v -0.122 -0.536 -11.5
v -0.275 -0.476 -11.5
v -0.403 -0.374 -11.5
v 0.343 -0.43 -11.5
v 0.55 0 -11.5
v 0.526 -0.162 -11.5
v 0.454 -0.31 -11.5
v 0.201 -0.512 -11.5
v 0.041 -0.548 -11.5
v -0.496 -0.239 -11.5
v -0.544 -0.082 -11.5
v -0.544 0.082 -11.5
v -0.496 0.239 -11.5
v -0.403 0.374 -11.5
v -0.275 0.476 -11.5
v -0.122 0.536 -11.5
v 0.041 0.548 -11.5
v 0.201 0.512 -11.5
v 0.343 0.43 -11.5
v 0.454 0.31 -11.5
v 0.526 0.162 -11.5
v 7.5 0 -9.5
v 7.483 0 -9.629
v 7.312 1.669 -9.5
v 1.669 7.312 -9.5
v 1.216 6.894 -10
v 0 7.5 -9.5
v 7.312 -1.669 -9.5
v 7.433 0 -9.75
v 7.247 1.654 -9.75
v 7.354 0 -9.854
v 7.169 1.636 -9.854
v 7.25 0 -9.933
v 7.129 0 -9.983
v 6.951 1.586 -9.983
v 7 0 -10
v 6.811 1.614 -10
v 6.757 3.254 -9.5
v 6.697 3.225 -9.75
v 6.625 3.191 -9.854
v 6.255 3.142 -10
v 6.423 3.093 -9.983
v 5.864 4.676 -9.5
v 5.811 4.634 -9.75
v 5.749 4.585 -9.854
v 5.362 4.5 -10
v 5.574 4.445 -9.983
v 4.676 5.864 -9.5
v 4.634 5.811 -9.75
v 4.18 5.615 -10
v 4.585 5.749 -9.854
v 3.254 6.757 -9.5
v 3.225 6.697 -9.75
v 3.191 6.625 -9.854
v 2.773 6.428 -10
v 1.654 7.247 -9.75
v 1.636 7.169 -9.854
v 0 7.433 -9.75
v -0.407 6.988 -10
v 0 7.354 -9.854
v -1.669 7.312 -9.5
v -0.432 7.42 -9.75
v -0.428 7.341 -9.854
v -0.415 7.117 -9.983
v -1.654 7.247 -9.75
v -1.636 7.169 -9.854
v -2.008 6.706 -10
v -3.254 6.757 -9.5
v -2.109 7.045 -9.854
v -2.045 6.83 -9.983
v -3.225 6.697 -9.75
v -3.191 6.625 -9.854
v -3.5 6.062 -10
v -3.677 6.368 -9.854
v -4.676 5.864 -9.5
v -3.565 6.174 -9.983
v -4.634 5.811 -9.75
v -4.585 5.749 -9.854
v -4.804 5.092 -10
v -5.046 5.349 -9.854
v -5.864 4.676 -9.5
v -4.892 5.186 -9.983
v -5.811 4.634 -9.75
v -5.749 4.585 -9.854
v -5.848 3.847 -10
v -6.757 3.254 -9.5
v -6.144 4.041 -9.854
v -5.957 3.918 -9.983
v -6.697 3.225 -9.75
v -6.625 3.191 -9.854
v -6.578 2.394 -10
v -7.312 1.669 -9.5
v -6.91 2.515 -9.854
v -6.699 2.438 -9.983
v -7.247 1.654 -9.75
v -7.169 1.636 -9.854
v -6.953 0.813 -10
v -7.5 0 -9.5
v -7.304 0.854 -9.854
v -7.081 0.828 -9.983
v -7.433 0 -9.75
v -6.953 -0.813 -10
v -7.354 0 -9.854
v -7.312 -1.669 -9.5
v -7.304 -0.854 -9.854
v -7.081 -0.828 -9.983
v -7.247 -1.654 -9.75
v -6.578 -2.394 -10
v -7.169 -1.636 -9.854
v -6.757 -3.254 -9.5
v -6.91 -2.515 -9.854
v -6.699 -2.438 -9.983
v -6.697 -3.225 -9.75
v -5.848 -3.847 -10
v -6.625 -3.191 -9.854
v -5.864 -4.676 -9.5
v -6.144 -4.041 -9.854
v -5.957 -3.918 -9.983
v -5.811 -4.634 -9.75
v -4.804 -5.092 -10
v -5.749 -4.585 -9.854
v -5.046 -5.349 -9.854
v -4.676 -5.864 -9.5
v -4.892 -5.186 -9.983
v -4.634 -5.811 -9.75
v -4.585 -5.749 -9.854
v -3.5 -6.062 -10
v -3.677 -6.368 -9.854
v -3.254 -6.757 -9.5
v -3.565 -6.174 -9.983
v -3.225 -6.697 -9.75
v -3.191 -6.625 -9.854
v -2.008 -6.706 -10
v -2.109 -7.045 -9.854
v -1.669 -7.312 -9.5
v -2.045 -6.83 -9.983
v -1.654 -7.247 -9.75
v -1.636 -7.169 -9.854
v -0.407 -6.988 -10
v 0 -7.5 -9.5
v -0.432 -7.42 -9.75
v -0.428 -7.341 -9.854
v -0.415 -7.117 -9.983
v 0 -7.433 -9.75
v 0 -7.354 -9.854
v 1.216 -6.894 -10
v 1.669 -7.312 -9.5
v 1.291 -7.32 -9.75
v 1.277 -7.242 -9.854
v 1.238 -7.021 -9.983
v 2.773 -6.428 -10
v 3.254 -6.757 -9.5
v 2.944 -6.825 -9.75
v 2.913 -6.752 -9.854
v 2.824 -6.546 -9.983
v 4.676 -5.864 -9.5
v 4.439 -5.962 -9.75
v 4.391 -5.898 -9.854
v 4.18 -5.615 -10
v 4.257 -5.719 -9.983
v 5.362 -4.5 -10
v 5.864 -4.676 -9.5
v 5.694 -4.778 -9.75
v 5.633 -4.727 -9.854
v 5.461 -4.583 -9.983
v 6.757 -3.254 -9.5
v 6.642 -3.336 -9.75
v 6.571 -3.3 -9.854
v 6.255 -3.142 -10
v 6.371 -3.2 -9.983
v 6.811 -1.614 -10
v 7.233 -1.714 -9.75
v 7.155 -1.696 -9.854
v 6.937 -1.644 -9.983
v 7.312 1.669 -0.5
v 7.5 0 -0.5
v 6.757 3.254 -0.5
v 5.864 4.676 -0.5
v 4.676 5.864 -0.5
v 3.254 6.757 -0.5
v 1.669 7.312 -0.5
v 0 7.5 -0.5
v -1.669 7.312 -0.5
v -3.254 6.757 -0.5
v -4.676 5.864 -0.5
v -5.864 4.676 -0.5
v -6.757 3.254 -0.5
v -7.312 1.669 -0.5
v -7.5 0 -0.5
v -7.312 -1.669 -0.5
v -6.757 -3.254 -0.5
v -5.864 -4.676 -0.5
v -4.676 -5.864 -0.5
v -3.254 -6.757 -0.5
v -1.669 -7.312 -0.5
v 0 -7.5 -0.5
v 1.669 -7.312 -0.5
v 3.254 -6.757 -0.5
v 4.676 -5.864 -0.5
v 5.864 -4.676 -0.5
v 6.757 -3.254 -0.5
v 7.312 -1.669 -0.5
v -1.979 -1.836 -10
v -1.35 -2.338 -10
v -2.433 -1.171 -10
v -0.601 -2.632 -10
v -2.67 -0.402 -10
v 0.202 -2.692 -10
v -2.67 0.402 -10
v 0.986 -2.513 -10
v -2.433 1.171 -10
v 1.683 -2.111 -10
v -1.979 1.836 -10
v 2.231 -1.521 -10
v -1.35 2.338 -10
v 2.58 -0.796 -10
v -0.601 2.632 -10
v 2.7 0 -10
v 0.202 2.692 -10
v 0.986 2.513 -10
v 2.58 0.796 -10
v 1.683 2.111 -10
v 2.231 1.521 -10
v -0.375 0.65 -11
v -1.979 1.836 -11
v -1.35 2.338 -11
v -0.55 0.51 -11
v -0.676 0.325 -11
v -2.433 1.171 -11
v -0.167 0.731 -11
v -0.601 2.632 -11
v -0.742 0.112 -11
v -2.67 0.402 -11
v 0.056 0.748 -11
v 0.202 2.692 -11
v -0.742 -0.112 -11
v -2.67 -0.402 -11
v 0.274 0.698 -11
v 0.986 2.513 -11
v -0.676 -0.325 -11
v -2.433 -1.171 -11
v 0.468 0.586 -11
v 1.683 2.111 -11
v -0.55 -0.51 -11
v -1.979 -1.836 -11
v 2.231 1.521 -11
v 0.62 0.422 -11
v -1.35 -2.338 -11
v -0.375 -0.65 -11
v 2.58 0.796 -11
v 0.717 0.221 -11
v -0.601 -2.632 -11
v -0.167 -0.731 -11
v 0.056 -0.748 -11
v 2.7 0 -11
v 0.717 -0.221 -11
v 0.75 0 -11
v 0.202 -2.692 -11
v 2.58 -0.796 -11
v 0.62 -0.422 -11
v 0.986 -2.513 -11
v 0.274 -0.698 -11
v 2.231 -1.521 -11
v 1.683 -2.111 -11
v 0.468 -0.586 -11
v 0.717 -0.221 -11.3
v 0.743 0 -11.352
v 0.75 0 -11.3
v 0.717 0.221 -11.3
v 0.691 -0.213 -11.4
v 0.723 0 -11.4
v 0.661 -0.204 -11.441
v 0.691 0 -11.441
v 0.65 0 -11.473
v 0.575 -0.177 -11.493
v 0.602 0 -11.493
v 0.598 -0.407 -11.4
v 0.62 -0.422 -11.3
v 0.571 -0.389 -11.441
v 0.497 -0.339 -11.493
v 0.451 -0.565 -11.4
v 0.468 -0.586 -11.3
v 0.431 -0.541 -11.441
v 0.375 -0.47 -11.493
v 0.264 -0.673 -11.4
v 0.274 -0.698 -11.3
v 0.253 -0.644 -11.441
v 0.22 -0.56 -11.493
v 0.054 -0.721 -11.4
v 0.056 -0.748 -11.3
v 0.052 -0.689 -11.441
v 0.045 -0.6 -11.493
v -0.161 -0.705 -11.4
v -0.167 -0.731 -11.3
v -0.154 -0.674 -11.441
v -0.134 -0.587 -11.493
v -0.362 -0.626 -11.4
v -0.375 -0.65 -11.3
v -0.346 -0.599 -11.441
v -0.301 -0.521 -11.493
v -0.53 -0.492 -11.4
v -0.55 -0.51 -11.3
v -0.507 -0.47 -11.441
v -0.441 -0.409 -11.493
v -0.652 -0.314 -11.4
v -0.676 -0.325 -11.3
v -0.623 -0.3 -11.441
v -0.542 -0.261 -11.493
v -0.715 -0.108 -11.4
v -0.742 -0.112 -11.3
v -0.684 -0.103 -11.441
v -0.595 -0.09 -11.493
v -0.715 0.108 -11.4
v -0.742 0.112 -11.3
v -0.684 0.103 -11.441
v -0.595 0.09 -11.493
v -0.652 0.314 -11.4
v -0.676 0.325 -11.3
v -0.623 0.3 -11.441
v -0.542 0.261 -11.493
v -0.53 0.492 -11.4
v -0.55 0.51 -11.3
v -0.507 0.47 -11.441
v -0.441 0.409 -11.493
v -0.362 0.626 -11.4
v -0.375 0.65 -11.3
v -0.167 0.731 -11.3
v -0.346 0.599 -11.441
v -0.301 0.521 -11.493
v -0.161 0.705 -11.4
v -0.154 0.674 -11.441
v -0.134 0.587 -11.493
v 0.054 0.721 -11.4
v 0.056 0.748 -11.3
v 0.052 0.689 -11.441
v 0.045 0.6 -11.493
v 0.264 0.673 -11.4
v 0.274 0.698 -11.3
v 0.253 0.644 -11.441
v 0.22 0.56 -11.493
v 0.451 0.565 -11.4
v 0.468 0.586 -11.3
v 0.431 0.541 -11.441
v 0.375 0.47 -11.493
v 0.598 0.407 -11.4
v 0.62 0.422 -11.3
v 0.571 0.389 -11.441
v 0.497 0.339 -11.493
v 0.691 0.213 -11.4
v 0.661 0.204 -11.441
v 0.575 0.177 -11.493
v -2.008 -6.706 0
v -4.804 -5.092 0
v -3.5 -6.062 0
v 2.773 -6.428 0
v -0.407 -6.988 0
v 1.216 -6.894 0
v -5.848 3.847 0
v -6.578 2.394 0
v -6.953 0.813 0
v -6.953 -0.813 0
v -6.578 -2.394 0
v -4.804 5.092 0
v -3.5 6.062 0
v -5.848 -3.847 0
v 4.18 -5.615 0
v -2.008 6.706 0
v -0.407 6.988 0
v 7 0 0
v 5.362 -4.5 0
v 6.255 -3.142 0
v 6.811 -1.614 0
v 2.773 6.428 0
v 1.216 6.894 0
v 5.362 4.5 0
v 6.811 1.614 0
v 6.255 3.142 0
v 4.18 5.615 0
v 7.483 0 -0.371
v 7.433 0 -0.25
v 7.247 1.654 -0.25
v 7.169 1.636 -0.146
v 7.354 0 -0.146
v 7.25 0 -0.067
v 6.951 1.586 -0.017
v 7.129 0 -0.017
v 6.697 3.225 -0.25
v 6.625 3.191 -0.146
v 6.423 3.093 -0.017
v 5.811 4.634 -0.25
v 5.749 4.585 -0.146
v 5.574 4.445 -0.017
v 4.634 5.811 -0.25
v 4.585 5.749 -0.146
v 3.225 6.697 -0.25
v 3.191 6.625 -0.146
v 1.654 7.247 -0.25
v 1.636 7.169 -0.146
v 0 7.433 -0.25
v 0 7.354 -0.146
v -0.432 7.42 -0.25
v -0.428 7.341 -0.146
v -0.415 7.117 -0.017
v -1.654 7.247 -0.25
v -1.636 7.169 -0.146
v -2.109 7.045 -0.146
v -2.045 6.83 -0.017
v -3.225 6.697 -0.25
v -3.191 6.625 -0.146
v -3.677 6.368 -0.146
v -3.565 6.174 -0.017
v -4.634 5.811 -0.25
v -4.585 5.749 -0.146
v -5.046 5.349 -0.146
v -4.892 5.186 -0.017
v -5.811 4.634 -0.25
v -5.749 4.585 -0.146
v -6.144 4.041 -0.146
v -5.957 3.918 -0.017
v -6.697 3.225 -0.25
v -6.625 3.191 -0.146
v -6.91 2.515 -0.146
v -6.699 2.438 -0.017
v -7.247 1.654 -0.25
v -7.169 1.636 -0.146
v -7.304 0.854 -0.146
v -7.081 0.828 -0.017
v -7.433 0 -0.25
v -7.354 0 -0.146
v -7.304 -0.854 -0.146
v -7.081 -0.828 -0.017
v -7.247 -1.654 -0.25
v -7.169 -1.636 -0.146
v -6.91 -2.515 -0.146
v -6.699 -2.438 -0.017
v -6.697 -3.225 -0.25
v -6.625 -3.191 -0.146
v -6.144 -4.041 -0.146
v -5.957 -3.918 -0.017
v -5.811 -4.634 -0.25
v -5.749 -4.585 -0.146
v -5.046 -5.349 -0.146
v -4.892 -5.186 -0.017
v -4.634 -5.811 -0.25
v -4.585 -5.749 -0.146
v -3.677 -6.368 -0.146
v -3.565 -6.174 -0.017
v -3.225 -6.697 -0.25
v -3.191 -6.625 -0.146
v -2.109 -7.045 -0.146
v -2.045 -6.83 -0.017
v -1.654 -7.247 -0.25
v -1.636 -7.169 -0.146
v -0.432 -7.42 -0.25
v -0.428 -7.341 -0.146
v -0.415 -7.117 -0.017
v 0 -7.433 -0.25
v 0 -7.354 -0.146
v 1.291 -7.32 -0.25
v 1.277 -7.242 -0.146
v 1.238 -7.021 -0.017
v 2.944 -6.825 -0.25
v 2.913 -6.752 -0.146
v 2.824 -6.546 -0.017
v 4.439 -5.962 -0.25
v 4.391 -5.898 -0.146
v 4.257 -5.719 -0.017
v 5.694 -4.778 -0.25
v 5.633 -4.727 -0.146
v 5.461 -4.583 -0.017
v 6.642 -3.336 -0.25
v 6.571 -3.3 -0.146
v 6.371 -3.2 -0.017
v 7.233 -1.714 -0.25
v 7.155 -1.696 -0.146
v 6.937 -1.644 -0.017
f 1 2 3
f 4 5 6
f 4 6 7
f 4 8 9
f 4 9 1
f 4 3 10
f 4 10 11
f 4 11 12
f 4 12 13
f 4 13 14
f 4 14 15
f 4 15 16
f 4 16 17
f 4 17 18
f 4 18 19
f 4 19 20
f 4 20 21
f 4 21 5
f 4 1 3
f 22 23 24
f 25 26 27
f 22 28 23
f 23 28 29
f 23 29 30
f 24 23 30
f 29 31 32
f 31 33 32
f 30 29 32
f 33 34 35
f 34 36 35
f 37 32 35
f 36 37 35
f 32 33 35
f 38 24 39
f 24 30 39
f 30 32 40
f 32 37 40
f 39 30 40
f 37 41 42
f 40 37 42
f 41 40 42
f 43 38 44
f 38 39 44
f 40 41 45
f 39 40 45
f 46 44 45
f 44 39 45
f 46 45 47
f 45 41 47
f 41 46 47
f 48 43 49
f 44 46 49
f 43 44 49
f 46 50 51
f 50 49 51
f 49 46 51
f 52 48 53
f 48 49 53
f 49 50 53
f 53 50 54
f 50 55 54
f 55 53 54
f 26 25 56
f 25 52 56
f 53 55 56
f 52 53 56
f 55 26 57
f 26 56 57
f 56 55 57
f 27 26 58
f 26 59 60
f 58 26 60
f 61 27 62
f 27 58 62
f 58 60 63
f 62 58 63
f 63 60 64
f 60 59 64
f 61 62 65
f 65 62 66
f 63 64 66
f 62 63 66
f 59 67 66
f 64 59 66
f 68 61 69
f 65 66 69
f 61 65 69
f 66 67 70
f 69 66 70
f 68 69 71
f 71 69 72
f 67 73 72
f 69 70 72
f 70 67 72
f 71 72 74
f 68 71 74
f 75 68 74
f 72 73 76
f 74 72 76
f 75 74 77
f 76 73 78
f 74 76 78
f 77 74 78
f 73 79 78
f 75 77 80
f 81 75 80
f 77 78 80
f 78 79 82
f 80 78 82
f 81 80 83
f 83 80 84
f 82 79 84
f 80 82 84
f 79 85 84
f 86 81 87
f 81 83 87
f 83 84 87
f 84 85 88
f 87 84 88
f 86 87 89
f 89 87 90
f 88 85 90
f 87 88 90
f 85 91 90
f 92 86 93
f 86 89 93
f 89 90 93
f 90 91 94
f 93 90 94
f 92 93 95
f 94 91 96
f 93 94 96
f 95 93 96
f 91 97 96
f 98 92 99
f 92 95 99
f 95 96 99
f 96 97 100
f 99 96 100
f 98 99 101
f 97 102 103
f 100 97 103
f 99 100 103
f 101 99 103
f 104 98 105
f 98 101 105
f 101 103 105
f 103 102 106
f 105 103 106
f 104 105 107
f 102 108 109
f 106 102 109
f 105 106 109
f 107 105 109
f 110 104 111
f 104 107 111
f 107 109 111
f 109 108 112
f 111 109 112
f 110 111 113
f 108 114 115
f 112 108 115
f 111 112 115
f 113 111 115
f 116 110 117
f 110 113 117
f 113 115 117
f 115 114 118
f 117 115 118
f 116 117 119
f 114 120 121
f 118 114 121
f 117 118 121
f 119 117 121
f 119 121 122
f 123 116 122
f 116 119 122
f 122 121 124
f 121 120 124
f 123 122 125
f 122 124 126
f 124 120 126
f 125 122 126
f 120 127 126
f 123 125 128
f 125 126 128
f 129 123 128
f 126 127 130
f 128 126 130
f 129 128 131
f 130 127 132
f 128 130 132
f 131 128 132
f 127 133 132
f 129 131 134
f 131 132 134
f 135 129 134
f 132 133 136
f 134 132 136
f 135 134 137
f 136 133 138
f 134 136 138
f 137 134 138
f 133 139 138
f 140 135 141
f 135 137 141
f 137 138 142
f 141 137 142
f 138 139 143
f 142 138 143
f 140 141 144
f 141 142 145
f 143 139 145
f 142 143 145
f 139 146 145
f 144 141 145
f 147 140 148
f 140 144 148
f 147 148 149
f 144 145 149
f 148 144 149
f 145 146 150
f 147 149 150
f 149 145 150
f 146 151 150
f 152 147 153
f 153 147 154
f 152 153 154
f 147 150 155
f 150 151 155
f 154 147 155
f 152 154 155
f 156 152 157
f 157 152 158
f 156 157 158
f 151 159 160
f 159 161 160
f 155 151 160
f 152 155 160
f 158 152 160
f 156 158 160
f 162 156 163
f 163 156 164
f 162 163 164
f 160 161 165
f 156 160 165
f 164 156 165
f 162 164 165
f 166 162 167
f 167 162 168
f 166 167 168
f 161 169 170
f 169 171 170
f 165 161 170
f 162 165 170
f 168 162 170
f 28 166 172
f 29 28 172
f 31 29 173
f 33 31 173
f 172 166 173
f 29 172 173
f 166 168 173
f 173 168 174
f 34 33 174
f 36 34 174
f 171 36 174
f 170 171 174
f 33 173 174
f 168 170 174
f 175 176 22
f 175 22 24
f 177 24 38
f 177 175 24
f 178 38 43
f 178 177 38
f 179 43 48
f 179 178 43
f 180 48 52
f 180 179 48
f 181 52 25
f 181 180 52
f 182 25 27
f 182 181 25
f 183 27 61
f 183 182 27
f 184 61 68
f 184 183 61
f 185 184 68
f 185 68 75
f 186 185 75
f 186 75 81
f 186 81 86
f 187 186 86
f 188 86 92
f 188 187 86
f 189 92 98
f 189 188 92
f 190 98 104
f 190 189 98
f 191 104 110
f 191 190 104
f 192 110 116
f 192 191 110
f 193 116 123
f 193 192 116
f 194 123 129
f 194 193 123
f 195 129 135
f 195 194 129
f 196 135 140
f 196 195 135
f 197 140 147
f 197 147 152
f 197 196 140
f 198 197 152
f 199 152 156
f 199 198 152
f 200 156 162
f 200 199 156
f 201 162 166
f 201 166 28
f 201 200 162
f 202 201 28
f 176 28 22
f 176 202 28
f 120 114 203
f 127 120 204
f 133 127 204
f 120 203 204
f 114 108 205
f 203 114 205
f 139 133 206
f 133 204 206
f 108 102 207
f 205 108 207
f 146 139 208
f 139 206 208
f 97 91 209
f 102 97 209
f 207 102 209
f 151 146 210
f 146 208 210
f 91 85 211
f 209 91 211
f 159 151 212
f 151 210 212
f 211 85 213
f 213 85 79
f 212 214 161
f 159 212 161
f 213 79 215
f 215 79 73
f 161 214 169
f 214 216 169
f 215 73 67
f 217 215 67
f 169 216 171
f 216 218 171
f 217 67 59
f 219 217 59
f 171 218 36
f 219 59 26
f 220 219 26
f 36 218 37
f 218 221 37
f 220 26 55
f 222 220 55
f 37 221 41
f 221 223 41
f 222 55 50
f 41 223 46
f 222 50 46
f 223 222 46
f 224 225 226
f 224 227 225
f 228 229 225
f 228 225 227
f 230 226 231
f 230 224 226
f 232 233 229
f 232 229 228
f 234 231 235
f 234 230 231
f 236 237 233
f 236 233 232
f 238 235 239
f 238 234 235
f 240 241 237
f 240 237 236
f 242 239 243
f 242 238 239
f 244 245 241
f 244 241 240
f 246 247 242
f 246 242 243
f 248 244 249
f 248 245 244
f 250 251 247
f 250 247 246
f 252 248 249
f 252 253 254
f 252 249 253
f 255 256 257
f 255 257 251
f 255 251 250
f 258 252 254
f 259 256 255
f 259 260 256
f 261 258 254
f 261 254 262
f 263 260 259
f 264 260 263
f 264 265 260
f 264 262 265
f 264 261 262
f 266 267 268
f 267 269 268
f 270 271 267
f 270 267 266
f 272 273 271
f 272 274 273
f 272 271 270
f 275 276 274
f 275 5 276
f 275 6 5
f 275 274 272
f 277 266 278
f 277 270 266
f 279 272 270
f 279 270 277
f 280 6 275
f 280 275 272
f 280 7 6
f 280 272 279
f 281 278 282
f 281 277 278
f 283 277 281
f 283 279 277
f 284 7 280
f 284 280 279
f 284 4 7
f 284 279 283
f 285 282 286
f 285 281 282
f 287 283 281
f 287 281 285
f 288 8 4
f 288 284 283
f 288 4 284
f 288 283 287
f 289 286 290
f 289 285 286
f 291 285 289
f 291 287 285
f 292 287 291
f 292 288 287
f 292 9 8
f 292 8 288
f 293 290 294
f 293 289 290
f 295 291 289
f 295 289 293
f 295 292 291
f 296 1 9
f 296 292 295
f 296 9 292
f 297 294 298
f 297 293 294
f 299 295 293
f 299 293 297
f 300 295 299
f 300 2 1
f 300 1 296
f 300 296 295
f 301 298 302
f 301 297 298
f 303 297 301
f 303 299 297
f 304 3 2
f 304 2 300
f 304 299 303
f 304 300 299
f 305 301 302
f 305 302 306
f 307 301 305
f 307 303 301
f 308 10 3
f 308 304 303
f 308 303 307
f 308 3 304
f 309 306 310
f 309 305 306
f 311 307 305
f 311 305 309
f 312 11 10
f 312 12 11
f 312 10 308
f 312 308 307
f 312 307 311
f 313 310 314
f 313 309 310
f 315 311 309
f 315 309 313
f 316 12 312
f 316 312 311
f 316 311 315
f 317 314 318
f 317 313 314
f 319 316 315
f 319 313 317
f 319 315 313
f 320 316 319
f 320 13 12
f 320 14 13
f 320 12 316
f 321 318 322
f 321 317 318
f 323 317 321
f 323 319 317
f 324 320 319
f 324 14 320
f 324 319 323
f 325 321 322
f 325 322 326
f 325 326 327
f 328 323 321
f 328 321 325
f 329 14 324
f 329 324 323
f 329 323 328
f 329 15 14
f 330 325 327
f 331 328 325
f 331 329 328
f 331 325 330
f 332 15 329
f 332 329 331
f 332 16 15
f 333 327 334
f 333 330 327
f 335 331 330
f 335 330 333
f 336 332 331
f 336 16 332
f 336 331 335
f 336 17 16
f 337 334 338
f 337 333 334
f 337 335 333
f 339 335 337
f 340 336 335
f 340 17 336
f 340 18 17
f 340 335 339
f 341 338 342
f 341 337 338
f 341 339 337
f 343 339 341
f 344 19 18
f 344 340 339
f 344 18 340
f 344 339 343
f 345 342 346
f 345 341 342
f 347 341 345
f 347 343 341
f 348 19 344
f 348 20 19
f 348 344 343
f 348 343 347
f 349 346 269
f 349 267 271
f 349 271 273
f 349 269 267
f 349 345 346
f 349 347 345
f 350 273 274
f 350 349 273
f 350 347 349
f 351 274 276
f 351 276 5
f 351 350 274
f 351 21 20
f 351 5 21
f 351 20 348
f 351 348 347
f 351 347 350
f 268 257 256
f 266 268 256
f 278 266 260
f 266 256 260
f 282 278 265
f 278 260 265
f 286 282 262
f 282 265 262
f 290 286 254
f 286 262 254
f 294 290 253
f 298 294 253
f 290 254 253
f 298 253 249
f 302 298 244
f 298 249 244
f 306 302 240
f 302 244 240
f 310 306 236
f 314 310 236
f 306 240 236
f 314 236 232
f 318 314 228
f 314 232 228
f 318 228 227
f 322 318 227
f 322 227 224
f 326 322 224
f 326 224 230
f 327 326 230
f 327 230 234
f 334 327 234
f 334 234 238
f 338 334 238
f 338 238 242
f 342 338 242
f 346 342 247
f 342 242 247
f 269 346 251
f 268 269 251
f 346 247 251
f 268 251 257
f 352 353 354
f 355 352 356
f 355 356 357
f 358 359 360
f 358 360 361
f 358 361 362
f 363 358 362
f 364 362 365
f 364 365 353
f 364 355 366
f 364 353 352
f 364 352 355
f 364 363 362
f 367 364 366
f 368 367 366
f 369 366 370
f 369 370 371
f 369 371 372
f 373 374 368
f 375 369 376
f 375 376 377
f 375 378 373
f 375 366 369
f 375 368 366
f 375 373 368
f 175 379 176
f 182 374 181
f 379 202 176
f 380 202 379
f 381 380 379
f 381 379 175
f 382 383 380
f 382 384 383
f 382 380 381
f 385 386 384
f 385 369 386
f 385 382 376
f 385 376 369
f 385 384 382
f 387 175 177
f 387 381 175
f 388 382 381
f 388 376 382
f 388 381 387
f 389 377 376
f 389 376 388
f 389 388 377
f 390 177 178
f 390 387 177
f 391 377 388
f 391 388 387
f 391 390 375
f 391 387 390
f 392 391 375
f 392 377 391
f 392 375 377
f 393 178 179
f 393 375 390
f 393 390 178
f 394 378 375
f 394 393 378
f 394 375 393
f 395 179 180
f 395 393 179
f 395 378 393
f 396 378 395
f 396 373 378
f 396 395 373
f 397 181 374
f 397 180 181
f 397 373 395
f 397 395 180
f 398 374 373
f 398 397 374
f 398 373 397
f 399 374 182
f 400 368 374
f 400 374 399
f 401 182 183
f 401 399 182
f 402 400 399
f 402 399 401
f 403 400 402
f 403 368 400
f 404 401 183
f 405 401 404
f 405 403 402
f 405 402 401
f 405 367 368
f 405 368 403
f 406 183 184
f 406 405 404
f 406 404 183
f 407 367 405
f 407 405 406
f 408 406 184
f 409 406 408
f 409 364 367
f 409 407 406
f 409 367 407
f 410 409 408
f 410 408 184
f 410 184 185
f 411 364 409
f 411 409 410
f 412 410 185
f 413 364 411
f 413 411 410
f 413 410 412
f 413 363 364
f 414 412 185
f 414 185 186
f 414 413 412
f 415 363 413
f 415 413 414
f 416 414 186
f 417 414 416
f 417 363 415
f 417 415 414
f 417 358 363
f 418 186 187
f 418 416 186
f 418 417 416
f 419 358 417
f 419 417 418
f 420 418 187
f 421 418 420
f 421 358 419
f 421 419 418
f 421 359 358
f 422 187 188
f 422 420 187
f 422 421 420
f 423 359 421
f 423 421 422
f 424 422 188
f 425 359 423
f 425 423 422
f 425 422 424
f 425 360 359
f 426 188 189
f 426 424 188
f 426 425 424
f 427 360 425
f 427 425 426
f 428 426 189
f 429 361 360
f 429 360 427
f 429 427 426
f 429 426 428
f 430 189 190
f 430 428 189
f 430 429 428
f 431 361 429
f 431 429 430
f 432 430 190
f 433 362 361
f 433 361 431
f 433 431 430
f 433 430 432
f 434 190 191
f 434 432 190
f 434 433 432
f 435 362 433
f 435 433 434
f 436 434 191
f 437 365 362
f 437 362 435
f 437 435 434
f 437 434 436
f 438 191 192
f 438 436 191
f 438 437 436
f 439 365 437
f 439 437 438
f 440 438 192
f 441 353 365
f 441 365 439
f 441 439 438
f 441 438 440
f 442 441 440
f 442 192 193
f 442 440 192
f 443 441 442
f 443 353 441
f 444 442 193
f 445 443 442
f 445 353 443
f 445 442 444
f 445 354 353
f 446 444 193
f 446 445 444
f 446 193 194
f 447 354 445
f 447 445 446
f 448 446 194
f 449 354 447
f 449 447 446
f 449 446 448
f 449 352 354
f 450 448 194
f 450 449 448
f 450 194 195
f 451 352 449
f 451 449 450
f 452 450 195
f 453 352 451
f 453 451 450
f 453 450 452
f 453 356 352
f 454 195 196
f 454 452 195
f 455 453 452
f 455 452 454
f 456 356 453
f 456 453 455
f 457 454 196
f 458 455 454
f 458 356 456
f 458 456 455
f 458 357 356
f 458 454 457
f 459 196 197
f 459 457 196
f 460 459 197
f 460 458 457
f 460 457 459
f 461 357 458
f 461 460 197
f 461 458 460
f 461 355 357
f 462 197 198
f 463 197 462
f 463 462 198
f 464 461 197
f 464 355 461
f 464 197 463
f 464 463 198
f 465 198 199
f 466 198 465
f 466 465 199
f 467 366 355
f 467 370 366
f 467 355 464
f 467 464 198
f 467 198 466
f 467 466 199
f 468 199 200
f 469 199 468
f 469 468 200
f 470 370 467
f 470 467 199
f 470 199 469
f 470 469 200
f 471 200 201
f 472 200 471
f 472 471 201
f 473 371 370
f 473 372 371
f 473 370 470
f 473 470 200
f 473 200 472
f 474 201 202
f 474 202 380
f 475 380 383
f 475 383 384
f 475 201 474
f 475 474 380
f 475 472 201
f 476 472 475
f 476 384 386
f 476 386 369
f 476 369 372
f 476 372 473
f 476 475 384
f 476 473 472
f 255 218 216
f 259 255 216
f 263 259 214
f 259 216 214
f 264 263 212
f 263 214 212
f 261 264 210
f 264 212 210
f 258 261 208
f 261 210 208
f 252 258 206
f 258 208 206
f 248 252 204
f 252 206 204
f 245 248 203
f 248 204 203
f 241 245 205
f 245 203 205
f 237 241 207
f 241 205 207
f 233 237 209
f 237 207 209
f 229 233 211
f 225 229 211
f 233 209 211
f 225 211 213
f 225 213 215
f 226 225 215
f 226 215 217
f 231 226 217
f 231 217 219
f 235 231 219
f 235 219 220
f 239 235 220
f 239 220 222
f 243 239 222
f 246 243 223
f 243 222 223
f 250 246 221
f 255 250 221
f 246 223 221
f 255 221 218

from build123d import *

# Parameters (mm, degrees)
SKETCH004_R  = 7.5
PAD004_DEPTH = 10
FILLET_R     = 0.5
SKETCH005_R  = 2.7
PAD005_DEPTH = 1
SKETCH006_R  = 0.75
PAD006_DEPTH = 0.5
FILLET001_R  = 0.2


with BuildPart() as part:
    # Sketch004 → Pad004 (new body)
    with BuildSketch(Plane.XY):
        Circle(SKETCH004_R)
    extrude(amount=-PAD004_DEPTH)

    # Fillet
    fillet_edges = [part.edges().sort_by_distance(p)[0] for p in [
        (-7.5, 0, 0),
        (-7.5, 0, -10),
    ]]
    fillet(fillet_edges, radius=FILLET_R)

    # Sketch005 (on Face5 of Fillet) → Pad005 (join)
    with BuildSketch(Plane(origin=(0, 0, -10), x_dir=(1, 0, 0), z_dir=(0, 0, -1))):
        Circle(SKETCH005_R)
    extrude(amount=PAD005_DEPTH)

    # Sketch006 (on Face7 of Pad005) → Pad006 (join)
    with BuildSketch(Plane(origin=(0, 0, -11), x_dir=(1, 0, 0), z_dir=(0, 0, -1))):
        Circle(SKETCH006_R)
    extrude(amount=PAD006_DEPTH)

    # Fillet001
    fillet001_edges = [part.edges().sort_by_distance(p)[0] for p in [
        (-0.75, 0, -11.5),
    ]]
    fillet(fillet001_edges, radius=FILLET001_R)


solid = part.part
